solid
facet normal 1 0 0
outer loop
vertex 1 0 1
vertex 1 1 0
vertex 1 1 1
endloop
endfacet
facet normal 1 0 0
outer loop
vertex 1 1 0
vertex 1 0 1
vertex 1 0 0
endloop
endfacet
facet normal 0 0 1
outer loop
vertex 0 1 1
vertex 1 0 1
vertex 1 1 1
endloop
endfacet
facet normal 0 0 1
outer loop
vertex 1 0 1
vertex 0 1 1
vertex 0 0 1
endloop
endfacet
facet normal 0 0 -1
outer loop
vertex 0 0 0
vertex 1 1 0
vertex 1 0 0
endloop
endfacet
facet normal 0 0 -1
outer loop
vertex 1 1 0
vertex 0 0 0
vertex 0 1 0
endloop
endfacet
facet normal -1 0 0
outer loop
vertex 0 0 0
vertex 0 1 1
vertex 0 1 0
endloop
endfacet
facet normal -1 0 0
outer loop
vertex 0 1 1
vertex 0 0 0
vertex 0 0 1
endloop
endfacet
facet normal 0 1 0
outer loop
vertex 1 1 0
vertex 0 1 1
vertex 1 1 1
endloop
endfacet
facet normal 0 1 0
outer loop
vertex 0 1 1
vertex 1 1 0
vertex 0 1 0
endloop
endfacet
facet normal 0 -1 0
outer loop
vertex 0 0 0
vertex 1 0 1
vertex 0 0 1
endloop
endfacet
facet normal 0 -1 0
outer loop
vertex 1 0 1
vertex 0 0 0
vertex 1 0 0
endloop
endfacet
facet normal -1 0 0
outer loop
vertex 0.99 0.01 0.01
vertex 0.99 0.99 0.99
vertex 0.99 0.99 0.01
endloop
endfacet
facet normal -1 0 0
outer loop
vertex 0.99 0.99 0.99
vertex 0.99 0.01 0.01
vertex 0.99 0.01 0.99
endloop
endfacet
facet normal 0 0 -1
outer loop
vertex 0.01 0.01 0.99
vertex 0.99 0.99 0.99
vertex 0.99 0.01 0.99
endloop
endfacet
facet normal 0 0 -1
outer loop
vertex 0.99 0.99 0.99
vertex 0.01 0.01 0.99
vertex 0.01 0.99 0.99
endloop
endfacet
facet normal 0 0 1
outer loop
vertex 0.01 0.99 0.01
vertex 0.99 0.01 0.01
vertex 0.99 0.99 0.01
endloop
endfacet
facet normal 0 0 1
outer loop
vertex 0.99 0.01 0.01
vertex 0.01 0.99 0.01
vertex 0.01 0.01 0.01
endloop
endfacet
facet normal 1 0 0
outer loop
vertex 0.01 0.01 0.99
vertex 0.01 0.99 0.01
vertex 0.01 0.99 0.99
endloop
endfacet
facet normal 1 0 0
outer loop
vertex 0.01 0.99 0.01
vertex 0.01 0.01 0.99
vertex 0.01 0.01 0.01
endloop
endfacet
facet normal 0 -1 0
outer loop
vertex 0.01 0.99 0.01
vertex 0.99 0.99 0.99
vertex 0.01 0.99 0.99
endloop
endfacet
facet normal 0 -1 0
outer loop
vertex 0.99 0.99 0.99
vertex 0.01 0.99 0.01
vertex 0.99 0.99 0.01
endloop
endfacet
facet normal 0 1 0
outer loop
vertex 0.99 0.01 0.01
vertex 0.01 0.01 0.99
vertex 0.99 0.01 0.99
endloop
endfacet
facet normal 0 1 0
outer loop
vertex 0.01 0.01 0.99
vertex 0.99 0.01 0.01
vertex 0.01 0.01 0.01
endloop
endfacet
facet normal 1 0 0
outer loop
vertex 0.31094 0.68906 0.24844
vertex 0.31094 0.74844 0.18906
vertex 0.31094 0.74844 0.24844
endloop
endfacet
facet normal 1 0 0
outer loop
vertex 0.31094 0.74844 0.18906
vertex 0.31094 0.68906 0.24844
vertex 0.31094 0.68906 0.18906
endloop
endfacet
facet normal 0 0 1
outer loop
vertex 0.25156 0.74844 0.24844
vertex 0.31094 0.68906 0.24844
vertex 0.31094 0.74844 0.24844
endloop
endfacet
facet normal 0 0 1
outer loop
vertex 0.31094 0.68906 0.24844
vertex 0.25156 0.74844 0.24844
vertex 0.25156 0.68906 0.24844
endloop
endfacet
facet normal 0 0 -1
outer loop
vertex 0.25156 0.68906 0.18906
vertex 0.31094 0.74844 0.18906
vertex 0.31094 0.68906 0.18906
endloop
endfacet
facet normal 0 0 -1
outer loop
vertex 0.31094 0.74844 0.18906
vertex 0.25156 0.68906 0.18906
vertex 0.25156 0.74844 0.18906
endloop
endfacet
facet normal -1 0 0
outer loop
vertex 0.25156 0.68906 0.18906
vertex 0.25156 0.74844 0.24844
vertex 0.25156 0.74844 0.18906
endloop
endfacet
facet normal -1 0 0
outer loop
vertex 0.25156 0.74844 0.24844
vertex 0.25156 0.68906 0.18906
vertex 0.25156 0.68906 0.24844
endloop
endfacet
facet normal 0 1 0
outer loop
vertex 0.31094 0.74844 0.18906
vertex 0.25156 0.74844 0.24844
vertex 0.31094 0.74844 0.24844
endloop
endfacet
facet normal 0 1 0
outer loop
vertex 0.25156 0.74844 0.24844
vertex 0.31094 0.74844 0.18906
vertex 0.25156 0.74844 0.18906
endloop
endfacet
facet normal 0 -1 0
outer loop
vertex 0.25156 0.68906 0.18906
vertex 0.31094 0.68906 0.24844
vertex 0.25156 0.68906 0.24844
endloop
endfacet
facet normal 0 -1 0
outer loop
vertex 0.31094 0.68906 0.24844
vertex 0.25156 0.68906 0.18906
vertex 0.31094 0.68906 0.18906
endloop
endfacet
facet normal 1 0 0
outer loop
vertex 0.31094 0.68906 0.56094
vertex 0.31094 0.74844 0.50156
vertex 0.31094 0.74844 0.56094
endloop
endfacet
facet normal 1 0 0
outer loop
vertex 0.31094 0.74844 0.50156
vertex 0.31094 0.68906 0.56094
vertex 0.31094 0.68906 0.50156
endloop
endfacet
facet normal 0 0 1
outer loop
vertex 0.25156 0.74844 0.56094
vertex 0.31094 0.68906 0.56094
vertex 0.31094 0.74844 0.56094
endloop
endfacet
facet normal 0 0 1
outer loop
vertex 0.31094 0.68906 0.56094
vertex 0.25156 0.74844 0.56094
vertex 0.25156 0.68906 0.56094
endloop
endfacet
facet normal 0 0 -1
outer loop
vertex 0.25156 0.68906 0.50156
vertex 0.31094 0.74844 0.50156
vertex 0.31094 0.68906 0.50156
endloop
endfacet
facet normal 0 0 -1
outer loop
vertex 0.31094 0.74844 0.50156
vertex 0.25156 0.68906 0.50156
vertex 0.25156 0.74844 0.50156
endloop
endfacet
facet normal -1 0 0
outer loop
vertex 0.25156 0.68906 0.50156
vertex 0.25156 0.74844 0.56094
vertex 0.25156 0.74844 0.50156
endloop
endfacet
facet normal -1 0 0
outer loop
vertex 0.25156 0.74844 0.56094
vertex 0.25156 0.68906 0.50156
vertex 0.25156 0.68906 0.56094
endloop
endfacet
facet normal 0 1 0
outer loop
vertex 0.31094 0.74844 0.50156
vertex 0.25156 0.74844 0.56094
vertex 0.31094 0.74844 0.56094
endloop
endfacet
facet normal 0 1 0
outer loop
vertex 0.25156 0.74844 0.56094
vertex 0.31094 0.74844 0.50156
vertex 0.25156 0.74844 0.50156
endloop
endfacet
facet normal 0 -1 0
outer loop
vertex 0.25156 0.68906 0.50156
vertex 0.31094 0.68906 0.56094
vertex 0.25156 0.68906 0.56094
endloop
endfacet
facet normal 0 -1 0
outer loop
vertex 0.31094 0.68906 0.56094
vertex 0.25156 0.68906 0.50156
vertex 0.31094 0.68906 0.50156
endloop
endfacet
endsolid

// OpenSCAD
translate([0.28125, 0.71875, 0.21875]) color([0.5520344582857593, 0.4314091237024231, 0.948740131082828]) cube([0.059375, 0.059375, 0.059375], center=true);
translate([0.28125, 0.71875, 0.53125]) color([0.9700506994668261, 0.6061024485488671, 0.3314127140035952]) cube([0.059375, 0.059375, 0.059375], center=true);
color([0.3,0.3,0.3,0.3]) difference() { cube([1,1,1]); translate([0.01,0.01,0.01]) cube([0.98,0.98,0.98]); }
